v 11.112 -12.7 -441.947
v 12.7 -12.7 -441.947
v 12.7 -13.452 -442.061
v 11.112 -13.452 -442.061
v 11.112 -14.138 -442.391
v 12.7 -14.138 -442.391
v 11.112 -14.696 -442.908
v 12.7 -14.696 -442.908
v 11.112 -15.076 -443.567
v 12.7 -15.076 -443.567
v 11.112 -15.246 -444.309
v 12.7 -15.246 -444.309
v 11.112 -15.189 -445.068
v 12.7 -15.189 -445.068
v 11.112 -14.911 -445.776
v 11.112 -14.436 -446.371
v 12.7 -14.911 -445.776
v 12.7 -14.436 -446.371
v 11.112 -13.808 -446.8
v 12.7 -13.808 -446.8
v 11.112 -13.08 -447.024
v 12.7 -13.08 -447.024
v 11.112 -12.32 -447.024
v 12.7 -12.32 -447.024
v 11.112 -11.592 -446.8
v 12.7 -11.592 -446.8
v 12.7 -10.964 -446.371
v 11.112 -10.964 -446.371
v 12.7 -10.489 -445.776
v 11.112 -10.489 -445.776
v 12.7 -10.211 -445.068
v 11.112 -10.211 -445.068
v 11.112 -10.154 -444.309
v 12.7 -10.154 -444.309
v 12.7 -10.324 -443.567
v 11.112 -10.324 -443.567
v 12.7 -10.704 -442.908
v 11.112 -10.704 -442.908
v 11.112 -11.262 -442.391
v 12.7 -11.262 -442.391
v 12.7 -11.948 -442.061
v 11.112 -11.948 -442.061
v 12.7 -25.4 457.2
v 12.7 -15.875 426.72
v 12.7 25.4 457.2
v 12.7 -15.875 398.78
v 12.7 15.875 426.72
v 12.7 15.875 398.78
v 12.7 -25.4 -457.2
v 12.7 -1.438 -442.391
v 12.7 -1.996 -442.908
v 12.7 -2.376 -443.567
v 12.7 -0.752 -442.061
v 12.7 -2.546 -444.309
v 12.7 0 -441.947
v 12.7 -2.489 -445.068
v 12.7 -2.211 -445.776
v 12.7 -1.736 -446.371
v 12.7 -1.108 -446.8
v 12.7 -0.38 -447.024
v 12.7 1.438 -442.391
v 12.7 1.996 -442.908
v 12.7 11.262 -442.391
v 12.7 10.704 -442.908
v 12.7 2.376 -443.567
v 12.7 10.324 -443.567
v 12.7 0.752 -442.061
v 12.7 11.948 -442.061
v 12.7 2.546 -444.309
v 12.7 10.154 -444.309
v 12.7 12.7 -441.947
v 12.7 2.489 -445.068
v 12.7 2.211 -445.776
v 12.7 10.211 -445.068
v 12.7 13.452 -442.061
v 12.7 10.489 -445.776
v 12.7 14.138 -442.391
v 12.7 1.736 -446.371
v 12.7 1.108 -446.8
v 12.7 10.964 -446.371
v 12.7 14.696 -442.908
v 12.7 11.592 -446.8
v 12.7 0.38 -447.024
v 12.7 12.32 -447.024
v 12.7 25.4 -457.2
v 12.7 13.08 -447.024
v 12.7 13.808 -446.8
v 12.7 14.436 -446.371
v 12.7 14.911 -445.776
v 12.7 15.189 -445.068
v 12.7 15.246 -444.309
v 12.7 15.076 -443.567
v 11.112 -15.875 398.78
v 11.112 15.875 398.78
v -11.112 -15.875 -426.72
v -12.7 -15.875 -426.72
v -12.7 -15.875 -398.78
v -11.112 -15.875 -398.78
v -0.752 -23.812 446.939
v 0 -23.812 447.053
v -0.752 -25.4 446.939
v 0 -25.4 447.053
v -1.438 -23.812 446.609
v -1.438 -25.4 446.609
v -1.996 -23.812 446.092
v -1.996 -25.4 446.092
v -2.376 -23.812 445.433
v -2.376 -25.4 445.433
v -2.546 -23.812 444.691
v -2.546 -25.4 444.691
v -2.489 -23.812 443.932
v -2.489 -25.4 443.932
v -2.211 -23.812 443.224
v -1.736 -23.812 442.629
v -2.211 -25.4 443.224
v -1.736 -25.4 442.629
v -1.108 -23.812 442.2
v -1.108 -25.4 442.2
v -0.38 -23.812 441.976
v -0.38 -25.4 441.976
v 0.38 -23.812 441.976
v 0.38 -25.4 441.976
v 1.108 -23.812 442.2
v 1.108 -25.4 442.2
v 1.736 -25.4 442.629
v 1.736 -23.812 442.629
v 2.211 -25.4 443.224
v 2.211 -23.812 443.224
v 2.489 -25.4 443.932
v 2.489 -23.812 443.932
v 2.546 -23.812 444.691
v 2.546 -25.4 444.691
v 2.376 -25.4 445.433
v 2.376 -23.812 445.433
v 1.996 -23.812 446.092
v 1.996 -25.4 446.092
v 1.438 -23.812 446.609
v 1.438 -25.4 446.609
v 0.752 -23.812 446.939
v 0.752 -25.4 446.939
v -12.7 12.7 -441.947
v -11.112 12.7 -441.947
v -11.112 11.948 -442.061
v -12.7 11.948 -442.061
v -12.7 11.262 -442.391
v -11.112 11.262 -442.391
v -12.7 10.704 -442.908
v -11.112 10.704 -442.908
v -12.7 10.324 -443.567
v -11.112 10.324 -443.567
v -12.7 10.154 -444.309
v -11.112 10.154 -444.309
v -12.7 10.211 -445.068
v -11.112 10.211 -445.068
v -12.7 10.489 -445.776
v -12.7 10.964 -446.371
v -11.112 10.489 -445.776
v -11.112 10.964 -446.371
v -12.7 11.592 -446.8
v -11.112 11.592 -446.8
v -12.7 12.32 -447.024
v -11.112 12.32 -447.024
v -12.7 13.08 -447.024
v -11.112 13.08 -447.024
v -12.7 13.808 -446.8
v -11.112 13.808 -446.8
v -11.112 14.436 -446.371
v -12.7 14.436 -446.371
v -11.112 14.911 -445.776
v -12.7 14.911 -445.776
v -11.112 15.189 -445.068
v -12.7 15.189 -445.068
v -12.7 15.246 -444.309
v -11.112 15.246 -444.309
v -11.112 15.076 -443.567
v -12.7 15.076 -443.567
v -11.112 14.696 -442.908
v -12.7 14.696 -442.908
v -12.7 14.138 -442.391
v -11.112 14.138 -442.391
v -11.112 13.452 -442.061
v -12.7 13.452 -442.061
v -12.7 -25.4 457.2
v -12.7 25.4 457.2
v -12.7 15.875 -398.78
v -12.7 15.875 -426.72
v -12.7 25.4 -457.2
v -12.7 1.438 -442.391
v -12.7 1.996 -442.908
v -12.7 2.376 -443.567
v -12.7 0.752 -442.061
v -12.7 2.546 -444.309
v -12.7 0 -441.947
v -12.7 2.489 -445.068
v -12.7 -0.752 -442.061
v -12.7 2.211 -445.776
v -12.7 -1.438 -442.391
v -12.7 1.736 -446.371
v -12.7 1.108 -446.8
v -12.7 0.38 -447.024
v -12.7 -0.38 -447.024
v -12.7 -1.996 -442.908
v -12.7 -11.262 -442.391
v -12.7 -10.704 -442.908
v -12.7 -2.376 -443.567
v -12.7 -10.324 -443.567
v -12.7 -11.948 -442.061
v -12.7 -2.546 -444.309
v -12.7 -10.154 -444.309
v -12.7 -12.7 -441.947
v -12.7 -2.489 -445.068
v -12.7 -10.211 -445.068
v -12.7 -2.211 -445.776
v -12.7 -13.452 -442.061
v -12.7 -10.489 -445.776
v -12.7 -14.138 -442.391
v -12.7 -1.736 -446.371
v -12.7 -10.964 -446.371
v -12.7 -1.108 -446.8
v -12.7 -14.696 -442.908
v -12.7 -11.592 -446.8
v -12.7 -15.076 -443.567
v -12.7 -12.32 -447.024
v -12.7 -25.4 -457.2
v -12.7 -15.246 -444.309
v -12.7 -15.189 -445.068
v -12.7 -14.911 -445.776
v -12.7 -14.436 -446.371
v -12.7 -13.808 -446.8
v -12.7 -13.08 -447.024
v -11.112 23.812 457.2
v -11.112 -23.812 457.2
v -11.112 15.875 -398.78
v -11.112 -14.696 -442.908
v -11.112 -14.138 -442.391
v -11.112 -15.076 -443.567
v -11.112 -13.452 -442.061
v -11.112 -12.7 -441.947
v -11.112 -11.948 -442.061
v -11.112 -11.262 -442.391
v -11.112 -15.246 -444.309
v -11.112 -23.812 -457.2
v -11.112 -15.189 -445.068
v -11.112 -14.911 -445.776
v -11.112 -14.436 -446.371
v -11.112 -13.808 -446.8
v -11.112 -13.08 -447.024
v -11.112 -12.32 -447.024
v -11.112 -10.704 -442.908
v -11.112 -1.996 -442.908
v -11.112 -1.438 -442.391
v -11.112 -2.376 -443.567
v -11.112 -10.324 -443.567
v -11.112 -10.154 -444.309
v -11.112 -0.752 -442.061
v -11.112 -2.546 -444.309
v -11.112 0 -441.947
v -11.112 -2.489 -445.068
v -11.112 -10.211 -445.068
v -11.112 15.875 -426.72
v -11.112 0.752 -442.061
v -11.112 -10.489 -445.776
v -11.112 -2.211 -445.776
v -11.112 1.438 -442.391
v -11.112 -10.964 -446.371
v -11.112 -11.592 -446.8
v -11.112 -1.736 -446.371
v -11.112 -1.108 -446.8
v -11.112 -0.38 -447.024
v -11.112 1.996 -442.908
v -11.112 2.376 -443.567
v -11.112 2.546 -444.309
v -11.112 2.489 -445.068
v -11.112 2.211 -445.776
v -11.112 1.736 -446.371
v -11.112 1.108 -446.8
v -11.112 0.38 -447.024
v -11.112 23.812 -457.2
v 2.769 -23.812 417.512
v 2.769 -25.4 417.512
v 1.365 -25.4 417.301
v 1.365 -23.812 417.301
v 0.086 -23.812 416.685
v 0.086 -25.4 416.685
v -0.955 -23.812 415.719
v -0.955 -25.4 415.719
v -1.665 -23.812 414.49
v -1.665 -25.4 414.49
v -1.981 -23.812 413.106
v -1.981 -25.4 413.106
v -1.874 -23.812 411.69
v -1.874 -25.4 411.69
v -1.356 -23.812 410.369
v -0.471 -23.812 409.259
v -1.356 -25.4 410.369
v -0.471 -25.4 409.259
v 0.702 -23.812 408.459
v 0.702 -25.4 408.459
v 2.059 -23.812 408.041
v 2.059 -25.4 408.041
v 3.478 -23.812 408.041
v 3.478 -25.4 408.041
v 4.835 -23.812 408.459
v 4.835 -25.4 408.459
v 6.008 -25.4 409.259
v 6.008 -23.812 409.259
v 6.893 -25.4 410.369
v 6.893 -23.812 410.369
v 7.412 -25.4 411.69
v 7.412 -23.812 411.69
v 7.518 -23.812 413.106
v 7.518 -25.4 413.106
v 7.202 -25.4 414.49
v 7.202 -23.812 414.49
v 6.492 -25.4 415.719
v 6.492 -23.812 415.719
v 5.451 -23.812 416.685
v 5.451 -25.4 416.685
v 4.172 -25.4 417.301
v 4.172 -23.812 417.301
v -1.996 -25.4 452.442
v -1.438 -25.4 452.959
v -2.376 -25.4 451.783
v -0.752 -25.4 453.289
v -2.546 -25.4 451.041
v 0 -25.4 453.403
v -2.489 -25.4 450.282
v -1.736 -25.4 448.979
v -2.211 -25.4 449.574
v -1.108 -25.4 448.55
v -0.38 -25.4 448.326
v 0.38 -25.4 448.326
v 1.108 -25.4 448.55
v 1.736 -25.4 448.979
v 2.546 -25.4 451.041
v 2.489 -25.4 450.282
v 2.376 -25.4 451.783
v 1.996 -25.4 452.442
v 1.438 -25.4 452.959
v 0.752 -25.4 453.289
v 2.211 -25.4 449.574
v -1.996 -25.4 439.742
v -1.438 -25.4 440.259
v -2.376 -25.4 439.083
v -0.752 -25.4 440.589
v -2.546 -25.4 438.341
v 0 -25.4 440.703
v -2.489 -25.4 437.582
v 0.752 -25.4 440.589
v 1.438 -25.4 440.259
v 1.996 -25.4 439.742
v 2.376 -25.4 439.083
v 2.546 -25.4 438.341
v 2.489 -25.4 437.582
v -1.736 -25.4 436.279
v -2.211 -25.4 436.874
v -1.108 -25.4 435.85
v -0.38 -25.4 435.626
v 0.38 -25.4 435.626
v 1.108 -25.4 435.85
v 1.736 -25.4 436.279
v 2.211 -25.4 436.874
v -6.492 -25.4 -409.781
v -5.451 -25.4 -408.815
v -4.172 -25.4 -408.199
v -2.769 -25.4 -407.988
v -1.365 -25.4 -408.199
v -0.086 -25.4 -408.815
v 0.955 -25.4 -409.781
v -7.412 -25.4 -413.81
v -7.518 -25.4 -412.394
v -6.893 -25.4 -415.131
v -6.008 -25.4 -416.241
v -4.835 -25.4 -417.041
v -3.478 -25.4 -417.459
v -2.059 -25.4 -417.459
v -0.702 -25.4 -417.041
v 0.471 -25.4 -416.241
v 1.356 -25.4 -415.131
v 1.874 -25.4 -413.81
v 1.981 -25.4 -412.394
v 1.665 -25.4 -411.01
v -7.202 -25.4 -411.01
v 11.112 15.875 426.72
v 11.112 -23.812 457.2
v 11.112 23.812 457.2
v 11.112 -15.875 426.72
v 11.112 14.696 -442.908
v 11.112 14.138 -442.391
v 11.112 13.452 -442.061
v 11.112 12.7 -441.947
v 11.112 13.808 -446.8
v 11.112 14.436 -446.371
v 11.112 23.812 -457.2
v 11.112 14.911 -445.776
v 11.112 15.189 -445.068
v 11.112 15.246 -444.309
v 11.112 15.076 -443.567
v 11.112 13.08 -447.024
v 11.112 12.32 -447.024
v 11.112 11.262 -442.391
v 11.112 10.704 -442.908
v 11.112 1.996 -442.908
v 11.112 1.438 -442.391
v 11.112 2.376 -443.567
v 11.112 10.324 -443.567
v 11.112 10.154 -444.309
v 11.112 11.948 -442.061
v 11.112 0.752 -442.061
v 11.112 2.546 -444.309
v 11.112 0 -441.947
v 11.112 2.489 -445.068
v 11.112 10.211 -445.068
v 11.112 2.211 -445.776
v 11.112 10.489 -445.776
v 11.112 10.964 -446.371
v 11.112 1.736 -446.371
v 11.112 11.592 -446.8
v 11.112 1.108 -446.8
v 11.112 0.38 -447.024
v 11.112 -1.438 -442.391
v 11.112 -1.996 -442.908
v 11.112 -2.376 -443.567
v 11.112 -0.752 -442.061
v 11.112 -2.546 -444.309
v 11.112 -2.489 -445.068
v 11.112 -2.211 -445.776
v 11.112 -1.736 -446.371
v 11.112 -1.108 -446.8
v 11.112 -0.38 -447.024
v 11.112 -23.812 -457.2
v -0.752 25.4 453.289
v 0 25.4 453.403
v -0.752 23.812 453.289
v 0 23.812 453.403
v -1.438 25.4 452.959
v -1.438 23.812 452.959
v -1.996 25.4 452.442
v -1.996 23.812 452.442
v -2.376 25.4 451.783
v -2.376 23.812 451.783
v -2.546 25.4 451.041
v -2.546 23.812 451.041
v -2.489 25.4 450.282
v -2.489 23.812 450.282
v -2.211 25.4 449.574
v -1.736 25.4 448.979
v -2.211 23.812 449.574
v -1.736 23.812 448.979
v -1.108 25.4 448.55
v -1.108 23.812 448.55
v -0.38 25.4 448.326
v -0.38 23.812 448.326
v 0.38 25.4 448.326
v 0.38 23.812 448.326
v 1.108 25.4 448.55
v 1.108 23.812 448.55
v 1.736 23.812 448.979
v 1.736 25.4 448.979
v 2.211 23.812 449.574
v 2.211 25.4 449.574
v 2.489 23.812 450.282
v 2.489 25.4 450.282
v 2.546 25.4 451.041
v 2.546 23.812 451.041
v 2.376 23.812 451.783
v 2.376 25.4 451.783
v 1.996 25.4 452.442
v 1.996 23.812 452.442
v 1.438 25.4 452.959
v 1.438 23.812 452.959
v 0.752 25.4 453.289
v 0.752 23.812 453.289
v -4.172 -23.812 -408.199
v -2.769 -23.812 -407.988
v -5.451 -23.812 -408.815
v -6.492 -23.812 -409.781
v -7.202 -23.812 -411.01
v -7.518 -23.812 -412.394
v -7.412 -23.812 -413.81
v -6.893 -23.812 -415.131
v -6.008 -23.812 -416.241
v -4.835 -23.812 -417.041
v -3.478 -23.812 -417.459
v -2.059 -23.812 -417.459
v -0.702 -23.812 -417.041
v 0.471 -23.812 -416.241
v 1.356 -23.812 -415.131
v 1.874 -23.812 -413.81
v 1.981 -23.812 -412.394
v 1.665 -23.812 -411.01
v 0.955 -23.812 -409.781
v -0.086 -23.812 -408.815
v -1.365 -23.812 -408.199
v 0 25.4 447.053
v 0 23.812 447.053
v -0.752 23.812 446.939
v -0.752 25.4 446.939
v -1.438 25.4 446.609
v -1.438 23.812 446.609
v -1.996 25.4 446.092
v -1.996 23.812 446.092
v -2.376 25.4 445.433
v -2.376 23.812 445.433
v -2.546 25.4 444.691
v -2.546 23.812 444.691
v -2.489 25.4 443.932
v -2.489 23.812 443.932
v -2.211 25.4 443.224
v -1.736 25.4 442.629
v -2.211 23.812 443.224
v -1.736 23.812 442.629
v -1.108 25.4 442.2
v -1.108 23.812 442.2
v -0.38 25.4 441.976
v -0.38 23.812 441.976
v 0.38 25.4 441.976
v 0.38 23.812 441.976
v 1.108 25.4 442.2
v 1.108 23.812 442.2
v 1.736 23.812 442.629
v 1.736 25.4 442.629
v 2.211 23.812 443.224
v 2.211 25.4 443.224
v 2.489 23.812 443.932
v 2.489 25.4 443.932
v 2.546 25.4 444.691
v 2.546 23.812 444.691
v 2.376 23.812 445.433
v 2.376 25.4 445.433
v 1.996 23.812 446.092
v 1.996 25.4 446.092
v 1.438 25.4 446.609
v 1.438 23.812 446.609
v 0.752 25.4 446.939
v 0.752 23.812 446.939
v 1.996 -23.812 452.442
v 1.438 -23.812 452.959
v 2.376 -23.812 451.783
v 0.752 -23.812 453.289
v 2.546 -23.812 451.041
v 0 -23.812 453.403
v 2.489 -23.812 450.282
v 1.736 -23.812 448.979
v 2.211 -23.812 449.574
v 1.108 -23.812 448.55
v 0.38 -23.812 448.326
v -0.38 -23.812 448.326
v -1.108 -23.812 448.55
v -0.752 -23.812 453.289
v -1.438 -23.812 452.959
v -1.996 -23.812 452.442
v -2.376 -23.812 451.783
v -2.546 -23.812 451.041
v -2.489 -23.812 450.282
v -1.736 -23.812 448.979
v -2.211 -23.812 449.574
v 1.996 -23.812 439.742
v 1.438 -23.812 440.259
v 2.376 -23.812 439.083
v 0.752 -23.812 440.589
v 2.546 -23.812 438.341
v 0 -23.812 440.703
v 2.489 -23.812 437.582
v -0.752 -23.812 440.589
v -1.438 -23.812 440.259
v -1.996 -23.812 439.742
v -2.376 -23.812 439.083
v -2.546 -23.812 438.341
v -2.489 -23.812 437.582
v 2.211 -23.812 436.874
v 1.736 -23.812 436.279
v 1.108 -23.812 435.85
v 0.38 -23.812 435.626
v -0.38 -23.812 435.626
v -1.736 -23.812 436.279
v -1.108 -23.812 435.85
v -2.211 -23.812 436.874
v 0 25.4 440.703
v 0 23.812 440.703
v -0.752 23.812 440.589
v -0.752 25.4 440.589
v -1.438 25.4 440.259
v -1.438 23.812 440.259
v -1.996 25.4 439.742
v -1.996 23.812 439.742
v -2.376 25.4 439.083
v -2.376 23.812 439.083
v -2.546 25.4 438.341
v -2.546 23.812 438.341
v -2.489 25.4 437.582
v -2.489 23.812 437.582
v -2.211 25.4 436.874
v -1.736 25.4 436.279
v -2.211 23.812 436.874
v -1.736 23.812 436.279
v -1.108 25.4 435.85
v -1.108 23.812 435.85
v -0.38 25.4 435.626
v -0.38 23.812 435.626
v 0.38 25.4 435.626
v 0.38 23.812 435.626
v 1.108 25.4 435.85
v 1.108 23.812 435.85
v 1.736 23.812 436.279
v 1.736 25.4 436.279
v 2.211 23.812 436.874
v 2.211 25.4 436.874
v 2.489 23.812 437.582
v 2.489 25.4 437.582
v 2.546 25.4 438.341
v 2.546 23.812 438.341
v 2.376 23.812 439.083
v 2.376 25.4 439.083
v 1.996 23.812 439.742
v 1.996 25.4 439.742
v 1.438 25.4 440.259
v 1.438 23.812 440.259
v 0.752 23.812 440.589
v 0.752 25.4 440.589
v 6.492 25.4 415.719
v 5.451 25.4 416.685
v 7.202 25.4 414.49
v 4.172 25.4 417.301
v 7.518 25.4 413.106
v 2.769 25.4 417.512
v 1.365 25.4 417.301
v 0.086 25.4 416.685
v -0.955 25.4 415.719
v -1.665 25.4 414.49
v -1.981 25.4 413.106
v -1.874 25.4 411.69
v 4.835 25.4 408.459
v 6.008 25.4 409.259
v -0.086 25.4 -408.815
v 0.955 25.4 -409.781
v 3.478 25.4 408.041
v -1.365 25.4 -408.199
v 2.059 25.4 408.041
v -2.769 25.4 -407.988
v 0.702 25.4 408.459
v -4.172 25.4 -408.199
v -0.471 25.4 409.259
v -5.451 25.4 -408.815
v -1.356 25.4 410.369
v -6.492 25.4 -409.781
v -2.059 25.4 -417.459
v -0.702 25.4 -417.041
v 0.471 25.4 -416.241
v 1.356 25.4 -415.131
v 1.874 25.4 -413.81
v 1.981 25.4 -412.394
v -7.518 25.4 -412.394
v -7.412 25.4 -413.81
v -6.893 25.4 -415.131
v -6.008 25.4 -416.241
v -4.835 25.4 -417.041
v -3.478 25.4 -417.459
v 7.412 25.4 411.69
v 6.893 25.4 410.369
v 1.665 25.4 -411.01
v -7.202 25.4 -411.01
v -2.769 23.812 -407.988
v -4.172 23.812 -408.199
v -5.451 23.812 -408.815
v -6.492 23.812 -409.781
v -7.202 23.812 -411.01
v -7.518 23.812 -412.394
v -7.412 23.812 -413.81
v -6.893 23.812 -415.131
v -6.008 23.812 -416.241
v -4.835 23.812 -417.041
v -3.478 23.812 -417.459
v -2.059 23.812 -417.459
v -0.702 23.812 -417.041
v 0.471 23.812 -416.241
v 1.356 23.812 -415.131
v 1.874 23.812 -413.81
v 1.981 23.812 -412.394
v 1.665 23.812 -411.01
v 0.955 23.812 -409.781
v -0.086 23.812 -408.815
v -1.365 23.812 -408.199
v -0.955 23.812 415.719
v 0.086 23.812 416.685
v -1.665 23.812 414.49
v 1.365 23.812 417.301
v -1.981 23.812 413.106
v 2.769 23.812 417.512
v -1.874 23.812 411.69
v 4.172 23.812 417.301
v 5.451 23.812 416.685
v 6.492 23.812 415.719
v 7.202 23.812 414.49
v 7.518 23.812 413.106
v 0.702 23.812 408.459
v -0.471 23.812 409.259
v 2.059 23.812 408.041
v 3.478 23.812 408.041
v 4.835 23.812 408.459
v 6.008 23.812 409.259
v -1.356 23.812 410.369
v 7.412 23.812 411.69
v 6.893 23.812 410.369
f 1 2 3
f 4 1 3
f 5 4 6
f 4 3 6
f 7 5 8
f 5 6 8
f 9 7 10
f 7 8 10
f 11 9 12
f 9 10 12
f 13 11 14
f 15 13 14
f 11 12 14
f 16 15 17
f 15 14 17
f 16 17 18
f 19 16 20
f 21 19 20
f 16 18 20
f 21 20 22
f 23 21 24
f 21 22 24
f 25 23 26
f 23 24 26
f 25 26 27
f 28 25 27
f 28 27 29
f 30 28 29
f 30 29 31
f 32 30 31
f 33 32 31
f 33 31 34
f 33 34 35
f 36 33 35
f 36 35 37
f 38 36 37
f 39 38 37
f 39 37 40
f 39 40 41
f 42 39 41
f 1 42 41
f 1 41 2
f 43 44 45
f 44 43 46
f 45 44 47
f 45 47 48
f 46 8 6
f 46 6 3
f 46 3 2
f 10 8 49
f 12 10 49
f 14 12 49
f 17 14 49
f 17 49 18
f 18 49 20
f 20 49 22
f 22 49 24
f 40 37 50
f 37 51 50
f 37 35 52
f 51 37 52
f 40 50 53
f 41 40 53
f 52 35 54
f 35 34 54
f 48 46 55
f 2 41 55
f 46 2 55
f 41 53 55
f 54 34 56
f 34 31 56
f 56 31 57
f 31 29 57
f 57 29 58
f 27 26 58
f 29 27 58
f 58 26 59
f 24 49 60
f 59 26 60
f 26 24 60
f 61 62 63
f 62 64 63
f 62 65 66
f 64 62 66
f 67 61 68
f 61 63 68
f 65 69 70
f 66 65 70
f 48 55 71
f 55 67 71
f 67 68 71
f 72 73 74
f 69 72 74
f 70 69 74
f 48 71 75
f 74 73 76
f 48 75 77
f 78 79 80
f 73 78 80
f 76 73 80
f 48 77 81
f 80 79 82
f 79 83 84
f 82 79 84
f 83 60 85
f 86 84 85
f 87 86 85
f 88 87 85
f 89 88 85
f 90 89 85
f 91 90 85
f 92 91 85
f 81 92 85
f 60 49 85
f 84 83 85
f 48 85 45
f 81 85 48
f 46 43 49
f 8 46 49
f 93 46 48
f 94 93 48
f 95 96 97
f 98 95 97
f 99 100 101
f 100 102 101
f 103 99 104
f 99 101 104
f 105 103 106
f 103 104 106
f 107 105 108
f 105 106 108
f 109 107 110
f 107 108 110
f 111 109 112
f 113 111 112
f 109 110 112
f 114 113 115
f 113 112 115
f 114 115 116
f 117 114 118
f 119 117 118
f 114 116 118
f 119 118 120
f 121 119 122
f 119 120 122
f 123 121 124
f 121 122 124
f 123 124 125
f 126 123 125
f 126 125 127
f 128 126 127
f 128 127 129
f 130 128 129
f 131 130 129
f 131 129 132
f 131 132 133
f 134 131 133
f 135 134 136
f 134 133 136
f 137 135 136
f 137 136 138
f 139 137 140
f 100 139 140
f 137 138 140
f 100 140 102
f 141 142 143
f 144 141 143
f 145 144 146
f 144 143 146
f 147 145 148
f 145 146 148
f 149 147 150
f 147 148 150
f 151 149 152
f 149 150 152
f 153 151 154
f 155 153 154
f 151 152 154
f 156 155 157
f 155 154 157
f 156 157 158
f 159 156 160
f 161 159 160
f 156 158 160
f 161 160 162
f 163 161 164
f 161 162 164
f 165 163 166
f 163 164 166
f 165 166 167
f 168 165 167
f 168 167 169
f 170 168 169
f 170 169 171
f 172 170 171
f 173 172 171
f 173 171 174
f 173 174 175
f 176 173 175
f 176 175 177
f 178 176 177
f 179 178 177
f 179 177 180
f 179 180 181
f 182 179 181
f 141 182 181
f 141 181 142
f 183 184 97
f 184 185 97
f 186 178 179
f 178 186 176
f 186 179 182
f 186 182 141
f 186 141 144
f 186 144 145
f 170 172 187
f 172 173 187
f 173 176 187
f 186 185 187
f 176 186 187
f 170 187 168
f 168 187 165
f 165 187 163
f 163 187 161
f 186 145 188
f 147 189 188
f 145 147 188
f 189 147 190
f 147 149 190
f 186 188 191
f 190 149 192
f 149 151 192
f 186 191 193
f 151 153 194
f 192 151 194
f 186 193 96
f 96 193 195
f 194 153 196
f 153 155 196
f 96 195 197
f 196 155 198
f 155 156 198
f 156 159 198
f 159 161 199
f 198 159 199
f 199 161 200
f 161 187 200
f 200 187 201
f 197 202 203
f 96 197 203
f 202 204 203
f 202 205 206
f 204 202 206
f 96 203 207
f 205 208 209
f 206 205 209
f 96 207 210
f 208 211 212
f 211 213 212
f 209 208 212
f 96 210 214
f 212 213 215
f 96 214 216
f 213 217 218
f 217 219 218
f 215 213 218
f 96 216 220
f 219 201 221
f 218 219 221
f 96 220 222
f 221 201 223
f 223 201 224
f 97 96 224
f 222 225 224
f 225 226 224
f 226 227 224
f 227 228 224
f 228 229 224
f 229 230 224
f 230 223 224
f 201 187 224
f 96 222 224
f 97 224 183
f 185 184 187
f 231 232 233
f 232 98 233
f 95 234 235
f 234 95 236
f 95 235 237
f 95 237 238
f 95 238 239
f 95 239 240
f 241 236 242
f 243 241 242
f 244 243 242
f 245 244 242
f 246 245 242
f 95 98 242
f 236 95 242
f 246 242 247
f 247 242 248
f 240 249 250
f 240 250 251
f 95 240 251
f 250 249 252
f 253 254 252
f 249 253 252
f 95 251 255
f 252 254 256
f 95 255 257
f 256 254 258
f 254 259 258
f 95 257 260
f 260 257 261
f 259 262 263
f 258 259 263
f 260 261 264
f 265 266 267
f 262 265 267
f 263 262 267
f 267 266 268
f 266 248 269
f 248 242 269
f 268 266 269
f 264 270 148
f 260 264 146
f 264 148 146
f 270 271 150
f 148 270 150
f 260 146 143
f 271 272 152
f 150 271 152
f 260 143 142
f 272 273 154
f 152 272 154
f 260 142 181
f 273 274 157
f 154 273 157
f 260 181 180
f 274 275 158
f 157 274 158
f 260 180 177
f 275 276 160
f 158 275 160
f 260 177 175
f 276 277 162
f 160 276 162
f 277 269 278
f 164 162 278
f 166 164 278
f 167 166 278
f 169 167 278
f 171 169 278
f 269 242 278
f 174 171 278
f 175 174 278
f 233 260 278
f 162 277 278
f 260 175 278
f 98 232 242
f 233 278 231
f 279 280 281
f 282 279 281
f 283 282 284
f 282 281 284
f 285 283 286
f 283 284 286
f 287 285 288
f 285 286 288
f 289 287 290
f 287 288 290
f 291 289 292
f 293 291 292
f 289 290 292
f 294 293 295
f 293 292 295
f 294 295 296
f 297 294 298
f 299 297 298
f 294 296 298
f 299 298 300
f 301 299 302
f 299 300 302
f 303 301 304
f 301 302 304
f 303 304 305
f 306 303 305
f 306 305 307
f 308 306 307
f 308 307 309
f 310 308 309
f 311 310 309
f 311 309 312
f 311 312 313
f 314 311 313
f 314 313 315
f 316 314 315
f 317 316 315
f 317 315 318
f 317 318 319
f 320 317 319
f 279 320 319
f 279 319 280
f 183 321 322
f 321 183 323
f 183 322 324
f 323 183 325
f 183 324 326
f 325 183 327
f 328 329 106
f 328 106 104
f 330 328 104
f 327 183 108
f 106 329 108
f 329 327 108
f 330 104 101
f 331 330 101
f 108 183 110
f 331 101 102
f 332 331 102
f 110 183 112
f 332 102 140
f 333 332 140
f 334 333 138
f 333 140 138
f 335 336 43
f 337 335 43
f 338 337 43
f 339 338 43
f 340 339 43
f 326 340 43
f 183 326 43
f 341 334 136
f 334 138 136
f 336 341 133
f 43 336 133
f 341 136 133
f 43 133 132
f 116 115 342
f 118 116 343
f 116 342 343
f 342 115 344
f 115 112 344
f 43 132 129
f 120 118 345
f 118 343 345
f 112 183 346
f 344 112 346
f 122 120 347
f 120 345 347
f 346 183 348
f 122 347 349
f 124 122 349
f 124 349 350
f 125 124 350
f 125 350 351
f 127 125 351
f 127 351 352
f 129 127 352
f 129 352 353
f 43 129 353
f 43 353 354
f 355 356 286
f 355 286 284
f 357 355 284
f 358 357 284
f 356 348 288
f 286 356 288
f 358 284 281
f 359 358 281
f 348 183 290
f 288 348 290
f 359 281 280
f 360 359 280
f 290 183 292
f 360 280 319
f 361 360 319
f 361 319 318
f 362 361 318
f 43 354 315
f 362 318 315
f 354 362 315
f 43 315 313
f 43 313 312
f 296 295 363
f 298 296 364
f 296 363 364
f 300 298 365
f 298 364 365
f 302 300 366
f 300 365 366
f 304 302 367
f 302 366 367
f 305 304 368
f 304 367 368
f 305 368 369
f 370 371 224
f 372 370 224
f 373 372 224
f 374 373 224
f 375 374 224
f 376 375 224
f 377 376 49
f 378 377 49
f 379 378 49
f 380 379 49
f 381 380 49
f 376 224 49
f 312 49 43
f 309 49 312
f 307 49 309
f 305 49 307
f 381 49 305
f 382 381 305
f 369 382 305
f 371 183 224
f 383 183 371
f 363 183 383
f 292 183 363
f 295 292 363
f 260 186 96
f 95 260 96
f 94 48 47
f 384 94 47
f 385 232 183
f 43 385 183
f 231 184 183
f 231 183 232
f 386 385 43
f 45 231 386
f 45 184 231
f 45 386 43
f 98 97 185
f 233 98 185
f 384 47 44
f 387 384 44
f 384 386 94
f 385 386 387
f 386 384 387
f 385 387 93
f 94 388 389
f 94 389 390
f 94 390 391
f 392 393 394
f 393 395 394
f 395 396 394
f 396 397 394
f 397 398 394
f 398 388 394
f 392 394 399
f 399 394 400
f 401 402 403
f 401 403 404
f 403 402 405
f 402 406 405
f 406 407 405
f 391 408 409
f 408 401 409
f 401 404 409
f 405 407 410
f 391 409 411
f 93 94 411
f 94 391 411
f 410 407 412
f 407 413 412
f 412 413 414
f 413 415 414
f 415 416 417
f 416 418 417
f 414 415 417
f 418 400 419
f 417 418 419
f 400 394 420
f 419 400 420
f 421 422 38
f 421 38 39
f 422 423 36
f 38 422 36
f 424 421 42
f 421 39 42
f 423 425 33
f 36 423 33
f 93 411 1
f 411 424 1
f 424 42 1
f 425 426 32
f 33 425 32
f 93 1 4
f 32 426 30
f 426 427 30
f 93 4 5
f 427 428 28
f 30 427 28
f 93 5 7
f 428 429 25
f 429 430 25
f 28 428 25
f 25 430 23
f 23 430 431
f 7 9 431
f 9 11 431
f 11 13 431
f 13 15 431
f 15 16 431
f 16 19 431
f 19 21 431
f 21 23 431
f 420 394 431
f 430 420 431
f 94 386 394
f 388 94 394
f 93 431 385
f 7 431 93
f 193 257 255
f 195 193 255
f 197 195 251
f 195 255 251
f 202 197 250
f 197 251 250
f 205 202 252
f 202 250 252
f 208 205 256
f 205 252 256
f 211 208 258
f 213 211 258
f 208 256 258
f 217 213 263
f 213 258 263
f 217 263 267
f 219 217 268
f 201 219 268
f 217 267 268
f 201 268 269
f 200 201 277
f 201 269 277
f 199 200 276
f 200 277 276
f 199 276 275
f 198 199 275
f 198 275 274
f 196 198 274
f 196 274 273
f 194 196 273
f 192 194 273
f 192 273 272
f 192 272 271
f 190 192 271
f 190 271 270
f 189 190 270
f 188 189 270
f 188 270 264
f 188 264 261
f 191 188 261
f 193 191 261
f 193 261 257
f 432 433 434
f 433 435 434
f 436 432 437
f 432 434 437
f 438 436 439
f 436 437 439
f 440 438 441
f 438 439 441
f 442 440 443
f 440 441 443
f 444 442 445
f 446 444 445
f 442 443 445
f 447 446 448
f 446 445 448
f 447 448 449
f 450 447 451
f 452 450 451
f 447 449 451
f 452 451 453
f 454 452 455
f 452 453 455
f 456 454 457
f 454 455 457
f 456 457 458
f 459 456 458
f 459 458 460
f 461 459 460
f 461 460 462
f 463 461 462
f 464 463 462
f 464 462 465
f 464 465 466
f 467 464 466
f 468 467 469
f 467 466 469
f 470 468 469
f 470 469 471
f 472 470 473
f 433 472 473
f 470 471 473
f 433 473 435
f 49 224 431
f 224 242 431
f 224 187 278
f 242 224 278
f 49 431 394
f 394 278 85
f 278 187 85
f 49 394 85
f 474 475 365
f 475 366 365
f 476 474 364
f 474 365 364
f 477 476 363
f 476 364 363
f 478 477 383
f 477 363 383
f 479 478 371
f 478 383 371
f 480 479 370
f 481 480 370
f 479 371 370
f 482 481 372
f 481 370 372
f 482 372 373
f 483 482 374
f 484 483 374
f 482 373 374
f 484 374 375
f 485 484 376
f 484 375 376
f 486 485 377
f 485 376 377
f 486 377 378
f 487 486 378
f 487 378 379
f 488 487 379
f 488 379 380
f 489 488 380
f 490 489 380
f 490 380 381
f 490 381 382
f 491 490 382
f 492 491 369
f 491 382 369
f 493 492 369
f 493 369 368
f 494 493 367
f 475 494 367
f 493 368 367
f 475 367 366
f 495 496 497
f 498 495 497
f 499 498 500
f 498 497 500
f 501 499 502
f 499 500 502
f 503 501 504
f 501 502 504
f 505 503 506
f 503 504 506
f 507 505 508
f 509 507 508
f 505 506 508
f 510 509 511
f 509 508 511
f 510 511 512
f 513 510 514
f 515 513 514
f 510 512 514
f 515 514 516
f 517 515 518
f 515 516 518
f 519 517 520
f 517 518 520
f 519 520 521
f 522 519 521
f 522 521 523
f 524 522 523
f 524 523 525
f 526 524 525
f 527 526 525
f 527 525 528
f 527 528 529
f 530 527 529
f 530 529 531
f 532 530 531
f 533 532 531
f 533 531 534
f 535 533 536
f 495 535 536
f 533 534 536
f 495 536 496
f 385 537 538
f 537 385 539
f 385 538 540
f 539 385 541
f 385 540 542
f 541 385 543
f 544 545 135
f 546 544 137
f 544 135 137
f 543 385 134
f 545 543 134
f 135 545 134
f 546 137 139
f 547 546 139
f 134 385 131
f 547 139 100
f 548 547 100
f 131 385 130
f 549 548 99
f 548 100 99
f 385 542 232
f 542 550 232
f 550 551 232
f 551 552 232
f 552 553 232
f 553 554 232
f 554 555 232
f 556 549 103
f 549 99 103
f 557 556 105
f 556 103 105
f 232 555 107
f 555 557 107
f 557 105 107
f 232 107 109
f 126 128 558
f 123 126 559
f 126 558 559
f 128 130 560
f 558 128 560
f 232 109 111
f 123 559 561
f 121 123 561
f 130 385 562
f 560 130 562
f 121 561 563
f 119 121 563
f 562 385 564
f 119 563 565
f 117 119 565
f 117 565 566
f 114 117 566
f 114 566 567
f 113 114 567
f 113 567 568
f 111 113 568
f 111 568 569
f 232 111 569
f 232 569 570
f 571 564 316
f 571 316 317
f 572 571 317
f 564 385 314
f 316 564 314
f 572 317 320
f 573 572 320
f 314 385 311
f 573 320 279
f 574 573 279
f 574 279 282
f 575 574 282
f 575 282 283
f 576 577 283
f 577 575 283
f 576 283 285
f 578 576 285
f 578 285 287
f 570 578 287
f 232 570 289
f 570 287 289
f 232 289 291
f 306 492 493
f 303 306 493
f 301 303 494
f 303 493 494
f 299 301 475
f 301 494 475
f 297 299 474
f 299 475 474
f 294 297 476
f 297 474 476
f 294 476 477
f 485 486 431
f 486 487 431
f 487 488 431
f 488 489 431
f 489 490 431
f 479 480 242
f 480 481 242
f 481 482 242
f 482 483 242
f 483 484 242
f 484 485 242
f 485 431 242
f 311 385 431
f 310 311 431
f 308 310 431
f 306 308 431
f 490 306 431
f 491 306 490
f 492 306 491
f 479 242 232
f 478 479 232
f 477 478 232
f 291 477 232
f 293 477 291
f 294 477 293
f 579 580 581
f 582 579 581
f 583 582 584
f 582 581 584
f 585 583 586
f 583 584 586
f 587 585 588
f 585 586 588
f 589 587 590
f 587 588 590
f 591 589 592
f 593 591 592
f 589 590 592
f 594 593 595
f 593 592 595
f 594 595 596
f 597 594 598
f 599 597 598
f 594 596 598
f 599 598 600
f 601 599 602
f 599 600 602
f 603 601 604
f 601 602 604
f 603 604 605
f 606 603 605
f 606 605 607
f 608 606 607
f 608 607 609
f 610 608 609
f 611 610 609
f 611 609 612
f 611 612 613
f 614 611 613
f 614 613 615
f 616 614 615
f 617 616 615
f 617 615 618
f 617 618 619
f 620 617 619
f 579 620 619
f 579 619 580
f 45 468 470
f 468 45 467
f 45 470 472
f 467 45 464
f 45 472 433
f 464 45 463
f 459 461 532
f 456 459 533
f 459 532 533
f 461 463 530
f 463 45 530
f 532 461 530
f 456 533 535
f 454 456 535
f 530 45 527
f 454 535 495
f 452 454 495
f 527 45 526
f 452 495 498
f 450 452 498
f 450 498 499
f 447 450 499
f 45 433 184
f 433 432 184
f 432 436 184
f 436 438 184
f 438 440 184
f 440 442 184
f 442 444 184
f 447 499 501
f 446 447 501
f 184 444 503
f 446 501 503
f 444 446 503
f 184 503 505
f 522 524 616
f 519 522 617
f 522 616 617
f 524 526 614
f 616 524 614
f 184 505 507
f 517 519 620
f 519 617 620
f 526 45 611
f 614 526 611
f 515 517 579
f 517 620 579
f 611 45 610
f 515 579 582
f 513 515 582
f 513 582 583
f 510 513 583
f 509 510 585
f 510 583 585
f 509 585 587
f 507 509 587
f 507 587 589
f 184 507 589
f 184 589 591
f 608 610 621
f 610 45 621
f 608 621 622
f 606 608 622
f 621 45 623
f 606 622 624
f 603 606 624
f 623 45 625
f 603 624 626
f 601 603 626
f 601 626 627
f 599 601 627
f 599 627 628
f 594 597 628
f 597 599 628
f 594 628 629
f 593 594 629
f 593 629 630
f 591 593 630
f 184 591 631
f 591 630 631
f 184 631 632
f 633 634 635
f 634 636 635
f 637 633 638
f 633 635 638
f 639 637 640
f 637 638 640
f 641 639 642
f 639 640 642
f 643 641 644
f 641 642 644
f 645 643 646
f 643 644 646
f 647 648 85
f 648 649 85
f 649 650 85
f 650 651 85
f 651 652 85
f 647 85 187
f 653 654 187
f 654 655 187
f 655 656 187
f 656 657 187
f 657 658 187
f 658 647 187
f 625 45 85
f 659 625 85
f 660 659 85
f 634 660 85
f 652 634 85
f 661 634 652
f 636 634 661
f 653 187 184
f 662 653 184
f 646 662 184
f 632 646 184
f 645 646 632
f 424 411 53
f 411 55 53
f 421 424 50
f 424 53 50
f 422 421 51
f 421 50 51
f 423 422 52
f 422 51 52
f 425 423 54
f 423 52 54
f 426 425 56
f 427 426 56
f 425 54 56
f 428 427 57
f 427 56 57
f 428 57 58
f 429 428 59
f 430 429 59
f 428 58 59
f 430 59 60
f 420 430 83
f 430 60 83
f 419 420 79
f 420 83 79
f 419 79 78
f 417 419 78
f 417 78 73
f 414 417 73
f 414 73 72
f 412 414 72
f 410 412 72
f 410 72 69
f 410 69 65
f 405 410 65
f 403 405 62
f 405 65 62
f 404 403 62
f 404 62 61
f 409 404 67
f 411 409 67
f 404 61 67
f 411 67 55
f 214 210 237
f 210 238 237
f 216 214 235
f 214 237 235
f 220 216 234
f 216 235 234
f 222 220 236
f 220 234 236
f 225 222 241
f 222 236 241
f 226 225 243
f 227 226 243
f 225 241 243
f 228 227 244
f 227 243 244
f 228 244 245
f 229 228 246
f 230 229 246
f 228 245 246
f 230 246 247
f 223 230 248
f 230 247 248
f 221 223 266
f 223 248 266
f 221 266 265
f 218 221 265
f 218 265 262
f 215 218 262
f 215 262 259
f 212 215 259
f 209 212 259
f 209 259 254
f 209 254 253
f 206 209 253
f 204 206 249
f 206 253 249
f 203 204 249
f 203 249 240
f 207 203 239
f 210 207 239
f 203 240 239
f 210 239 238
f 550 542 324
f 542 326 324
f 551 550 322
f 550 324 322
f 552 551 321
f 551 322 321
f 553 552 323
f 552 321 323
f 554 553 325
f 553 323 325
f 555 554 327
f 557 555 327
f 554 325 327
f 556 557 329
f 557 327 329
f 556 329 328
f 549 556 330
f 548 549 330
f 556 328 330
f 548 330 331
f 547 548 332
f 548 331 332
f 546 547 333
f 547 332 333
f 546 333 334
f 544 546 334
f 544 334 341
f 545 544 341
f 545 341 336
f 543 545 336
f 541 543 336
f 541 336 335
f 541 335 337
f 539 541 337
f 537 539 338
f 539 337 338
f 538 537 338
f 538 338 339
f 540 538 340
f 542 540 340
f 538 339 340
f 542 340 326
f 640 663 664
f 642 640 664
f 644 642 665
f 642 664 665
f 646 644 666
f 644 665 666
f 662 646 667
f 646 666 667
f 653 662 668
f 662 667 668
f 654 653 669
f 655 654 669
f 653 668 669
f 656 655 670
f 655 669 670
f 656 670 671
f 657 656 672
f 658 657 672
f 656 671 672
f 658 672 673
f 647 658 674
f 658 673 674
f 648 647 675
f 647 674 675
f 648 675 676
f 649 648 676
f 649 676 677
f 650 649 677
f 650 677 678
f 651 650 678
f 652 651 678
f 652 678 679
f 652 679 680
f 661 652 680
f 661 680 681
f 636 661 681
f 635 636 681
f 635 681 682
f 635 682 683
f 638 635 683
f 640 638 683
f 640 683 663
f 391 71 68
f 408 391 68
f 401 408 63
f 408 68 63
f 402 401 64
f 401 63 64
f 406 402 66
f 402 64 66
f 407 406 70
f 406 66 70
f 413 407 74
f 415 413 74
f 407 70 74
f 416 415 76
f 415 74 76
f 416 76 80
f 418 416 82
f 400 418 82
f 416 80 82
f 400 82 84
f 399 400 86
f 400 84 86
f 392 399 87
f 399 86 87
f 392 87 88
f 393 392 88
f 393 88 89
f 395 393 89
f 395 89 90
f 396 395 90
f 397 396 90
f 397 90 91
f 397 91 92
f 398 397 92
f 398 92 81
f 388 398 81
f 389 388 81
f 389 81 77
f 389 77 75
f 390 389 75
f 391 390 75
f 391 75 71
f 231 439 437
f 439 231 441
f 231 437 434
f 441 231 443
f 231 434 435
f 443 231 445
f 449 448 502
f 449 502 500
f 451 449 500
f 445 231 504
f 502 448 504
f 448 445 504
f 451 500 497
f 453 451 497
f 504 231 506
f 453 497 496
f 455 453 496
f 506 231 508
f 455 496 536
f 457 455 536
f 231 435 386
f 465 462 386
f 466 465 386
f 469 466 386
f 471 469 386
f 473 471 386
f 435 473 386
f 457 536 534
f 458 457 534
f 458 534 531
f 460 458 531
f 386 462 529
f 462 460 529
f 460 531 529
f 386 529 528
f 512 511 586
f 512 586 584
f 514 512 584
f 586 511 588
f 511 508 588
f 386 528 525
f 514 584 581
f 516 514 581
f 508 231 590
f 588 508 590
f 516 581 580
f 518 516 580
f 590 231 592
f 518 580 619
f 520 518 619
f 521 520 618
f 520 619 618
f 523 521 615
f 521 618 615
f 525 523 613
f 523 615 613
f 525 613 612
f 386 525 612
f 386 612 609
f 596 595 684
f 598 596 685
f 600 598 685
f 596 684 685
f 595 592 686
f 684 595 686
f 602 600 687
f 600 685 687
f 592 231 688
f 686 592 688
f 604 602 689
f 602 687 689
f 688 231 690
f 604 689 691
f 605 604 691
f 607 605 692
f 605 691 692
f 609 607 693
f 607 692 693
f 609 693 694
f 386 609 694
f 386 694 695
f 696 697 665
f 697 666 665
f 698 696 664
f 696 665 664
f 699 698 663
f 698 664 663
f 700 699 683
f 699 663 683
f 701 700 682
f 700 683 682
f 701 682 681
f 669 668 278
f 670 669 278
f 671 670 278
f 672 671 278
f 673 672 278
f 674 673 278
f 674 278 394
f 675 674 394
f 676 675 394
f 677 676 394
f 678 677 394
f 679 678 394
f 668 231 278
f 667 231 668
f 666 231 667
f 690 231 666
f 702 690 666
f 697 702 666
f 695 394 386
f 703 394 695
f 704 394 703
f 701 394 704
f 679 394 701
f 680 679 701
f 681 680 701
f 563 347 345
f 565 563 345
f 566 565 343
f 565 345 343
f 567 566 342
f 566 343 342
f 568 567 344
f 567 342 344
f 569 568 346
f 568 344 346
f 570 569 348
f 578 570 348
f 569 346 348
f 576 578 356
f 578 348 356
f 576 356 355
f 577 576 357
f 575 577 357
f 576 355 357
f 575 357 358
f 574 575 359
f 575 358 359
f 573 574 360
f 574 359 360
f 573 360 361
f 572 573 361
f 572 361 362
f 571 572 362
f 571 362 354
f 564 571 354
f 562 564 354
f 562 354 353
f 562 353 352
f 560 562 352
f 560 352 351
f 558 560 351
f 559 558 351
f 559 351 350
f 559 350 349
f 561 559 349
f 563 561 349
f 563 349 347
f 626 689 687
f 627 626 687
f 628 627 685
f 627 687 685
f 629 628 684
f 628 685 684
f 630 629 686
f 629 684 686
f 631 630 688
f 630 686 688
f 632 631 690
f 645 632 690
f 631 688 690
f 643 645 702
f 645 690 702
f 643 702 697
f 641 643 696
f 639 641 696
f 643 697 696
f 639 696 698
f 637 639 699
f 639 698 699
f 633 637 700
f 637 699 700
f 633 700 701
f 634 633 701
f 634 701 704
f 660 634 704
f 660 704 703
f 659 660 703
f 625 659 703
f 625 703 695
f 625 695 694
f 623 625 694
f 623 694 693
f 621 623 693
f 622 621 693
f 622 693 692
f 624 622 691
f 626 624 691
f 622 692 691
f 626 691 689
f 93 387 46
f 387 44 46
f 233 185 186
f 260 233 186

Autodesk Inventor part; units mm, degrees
ref_plane "YZ Plane" through (0, 0, 0) normal (1, 0, 0) x (0, 1, 0)
ref_plane "XZ Plane" through (0, 0, 0) normal (0, 1, 0) x (-1, 0, 0)
ref_plane "XY Plane" through (0, 0, 0) normal (0, 0, 1) x (1, 0, 0)
sketch "Sketch1" plane through (0, 0, 0) normal (0, 0, 1) x (1, 0, 0)
  line L0 (-12.7, -25.4) -> (12.7, -25.4)
  line L1 (12.7, -25.4) -> (12.7, 25.4)
  line L2 (12.7, 25.4) -> (-12.7, 25.4)
  line L3 (-12.7, 25.4) -> (-12.7, -25.4)
  line L4 (-12.7, -25.4) -> (12.7, 25.4) construction
  line L5 (12.7, -25.4) -> (-12.7, 25.4) construction
  line L6 (-11.1125, 23.8125) -> (11.1125, 23.8125)
  line L7 (11.1125, 23.8125) -> (11.1125, -23.8125)
  line L8 (11.1125, -23.8125) -> (-11.1125, -23.8125)
  line L9 (-11.1125, -23.8125) -> (-11.1125, 23.8125)
  point P0 (0, 0)
  dimension "width" = 25.4
  dimension "height" = 50.8
  dimension "thickness" = 1.5875
extrude "Extrusion1" add sketch "Sketch1" along normal mid plane 914.4
sketch "Sketch2" plane through (-12.7, 25.4, 457.2) normal (0, 1, 0) x (1, 0, 0)
  line L0 (25.4, 0) -> (0, 0) projected
  line L1 (0, 914.4) -> (0, 0) projected
  point P0 (12.7, 457.2)
  point P1 (12.7, 6.35)
  point P2 (12.7, 12.7)
  point P3 (12.7, 19.05)
  point P4 (12.7, 0)
  point P5 (12.7, 0)
  dimension "d5" = 6.35
  dimension "d6" = 6.35
  dimension "d7" = 6.35
hole "Hole1" at (0, 25.4, 450.85) at (0, 25.4, 444.5) at (0, 25.4, 438.15) direction (0, -1, 0) diameter 5.1054 end through all clearance for "Flat Head Machine Screw (82)" size "#10" standard "Ansi Unified Screw Threads"
sketch "Sketch3" plane through (-12.7, -25.4, 457.2) normal (-1, 0, 0) x (0, 0, 1)
  line L0 (-914.4, 0) -> (-914.4, 50.8) projected
  point P0 (-457.2, 25.4)
  point P1 (-901.7, 38.1)
  point P2 (-901.7, 25.4)
  point P3 (-901.7, 12.7)
  point P4 (-914.4, 25.4)
  dimension "d15" = 12.7
  dimension "d16" = 12.7
  dimension "d17" = 12.7
hole "Hole2" at (-12.7, 12.7, -444.5) at (-12.7, 0, -444.5) at (-12.7, -12.7, -444.5) direction (1, 0, 0) diameter 5.1054 end through all clearance for "Flat Head Machine Screw (82)" size "#10" standard "Ansi Unified Screw Threads"
sketch "Sketch4" plane through (-12.7, 25.4, 457.2) normal (0, 1, 0) x (1, 0, 0)
  circle A0 centre (12.7, 19.05) radius 2.5527 projected
  line L0 (25.4, 914.4) -> (25.4, 0) projected
  point P0 (12.7, 457.2)
  point P1 (15.4686, 44.45)
  dimension "d34" = 9.9314
  dimension "d55" = 25.4
hole "Hole3" at (2.7686, 25.4, 412.75) direction (0, -1, 0) diameter 9.525 end through all
sketch "Sketch5" plane through (-12.7, 25.4, 457.2) normal (0, 1, 0) x (1, 0, 0)
  line L0 (0, 914.4) -> (25.4, 914.4) projected
  line L1 (0, 914.4) -> (0, 0) projected
  point P0 (12.7, 457.2)
  point P1 (9.9314, 869.95)
  point P2 (12.7, 914.4)
  dimension "d35" = 44.45
  dimension "d36" = 9.9314
hole "Hole4" at (-2.7686, 25.4, -412.75) direction (0, -1, 0) diameter 9.525 end through all
sketch "Sketch6" plane through (12.7, -25.4, 457.2) normal (1, 0, 0) x (0, 0, -1)
  line L0 (58.42, 41.275) -> (30.48, 41.275)
  line L1 (30.48, 41.275) -> (30.48, 9.525)
  line L2 (30.48, 9.525) -> (58.42, 9.525)
  line L3 (58.42, 9.525) -> (58.42, 41.275)
  line L4 (58.42, 41.275) -> (30.48, 9.525) construction
  line L5 (30.48, 41.275) -> (58.42, 9.525) construction
  line L6 (0, 0) -> (0, 50.8) projected
  line L7 (914.4, 50.8) -> (0, 50.8) projected
  point P0 (457.2, 25.4)
  point P1 (44.45, 25.4)
  point P2 (0, 25.4)
  dimension "d44" = 30.48
  dimension "d45" = 27.94
  dimension "d47" = 31.75
extrude "Extrusion2" cut sketch "Sketch6" against normal blind 1.5875
sketch "Sketch7" plane through (-12.7, -25.4, 457.2) normal (-1, 0, 0) x (0, 0, 1)
  line L0 (-883.92, 9.525) -> (-855.98, 9.525)
  line L1 (-855.98, 9.525) -> (-855.98, 41.275)
  line L2 (-855.98, 41.275) -> (-883.92, 41.275)
  line L3 (-883.92, 41.275) -> (-883.92, 9.525)
  line L4 (-883.92, 9.525) -> (-855.98, 41.275) construction
  line L5 (-855.98, 9.525) -> (-883.92, 41.275) construction
  line L6 (-914.4, 0) -> (-914.4, 50.8) projected
  point P0 (-457.2, 25.4)
  point P1 (-869.95, 25.4)
  point P2 (-914.4, 25.4)
  dimension "d50" = 30.48
  dimension "d51" = 31.75
  dimension "d52" = 27.94
extrude "Extrusion3" cut sketch "Sketch7" against normal blind 1.5875
equation "\"d6\" = d5"
equation "\"d7\" = d6"
equation "\"d17\" = d16"
properties part number "EL2-004" material "Aluminum 6061"
